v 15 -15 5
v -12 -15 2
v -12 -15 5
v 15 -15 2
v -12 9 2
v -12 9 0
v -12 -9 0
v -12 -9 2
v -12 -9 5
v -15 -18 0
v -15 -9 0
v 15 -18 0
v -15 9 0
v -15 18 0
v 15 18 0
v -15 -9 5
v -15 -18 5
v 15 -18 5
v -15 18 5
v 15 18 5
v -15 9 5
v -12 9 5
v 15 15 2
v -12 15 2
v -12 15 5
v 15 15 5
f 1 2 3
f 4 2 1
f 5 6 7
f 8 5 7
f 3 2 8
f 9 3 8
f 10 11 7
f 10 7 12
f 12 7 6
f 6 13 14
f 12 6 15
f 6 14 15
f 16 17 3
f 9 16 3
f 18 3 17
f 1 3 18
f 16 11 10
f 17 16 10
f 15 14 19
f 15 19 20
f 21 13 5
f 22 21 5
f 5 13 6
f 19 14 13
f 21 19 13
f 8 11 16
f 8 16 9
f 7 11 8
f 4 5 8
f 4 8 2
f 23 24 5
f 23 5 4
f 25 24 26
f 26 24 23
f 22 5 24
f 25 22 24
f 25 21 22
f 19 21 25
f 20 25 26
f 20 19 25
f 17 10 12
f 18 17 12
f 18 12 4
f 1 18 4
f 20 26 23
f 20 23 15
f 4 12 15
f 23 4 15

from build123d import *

# Parameters (mm, degrees)
BOSS_EXTRUDE1_DEPTH = 2
BOSS_EXTRUDE2_DEPTH = 5


with BuildPart() as part:
    # Sketch1 → Boss-Extrude1 (new body)
    with BuildSketch(Plane.XY):
        Polygon((15, 18), (-15, 18), (-15, 9), (-12, 9), (-12, -9), (-15, -9), (-15, -18), (15, -18), align=None)
    extrude(amount=BOSS_EXTRUDE1_DEPTH)

    # Sketch1<3> → Boss-Extrude2 (add)
    with BuildSketch(Plane.XY):
        Polygon((-15, 9), (-12, 9), (-12, 15), (15, 15), (15, 18), (-15, 18), align=None)
        Polygon((-12, -15), (-12, -9), (-15, -9), (-15, -18), (15, -18), (15, -15), align=None)
    extrude(amount=BOSS_EXTRUDE2_DEPTH)


solid = part.part
